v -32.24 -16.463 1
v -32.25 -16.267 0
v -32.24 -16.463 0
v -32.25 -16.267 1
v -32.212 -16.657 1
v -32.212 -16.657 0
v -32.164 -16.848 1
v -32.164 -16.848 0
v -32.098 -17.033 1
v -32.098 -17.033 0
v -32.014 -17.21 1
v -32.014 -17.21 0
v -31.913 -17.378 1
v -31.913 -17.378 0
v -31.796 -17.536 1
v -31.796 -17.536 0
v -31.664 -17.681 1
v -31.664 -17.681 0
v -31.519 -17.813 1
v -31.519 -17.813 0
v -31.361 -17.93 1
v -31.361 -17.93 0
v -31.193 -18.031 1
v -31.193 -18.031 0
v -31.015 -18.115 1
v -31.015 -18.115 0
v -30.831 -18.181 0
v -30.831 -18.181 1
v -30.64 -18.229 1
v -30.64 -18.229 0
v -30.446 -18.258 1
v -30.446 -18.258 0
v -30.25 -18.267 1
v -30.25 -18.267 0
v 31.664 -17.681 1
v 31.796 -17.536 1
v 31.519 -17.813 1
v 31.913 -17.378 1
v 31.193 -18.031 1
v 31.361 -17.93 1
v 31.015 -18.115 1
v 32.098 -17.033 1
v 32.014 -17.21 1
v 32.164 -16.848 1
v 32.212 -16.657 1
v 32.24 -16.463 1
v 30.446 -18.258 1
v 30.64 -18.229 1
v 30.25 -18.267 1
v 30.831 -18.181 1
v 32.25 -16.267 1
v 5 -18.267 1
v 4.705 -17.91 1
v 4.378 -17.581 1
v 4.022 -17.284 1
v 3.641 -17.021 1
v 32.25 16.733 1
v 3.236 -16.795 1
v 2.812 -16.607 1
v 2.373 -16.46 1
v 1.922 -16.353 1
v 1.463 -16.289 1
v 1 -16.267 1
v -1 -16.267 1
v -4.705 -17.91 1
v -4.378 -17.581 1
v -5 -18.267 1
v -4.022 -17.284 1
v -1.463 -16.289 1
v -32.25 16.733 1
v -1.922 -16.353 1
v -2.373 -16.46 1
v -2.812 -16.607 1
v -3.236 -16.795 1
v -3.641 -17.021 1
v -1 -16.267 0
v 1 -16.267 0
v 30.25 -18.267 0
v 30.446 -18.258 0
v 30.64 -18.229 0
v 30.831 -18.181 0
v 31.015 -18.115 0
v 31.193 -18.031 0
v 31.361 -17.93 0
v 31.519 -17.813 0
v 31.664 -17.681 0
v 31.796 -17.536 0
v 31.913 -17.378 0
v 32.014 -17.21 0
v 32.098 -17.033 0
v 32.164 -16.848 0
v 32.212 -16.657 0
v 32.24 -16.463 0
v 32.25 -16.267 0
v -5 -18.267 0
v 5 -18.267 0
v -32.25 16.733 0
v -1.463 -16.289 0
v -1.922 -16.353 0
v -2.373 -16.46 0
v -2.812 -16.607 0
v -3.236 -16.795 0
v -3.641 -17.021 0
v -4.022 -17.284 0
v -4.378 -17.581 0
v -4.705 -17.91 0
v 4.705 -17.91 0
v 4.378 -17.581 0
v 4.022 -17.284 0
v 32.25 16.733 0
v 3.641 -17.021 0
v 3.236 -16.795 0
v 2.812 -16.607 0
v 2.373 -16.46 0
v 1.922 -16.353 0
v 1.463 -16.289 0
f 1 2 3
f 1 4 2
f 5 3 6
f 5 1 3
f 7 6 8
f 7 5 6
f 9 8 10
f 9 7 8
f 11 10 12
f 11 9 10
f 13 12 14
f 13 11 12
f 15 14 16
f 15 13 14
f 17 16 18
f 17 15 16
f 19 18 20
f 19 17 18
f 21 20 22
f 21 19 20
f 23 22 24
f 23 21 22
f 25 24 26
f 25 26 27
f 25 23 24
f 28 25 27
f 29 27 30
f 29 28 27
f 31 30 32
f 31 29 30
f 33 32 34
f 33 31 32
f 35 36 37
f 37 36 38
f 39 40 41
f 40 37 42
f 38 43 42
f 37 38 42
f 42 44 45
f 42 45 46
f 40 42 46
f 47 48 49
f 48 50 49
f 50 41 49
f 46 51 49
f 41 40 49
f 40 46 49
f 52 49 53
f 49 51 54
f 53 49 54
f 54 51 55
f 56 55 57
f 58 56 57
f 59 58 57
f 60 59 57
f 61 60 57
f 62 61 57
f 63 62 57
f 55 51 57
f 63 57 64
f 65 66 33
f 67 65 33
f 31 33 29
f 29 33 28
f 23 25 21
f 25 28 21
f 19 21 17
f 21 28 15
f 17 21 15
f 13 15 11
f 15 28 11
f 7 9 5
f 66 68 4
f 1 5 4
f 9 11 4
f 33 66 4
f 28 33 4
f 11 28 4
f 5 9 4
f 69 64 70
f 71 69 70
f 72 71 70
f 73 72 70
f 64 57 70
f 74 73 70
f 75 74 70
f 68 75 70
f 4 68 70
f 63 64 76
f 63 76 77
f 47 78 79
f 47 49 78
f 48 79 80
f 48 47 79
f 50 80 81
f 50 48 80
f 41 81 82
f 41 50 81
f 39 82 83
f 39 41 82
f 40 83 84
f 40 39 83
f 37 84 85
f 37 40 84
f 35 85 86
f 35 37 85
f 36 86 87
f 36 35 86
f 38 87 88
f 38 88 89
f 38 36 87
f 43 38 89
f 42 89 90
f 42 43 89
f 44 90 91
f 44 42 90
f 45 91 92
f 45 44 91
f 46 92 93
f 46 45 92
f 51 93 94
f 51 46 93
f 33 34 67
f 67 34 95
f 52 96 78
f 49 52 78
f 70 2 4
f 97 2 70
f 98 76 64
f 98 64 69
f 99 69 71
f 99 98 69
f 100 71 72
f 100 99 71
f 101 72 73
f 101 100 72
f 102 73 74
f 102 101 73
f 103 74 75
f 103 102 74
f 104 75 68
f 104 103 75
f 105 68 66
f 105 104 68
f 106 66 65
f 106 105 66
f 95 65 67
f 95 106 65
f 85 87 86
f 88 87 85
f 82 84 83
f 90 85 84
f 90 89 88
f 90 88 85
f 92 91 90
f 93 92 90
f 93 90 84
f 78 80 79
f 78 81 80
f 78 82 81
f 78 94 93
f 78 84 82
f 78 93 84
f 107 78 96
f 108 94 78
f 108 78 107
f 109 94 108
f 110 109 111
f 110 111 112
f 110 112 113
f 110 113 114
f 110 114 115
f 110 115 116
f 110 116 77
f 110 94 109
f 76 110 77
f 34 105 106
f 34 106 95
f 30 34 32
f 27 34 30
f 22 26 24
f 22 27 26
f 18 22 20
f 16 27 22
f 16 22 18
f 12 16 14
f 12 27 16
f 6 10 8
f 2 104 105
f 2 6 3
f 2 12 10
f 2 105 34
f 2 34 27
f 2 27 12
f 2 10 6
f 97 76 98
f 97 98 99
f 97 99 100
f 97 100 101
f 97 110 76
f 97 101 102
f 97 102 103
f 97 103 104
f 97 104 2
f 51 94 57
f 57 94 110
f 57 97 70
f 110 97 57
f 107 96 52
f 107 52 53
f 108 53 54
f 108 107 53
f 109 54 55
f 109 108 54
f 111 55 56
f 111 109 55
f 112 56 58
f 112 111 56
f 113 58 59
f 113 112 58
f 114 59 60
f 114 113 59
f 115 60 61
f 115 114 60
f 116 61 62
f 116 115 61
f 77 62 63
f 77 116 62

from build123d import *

# Parameters (mm, degrees)
F0_W        = 64.5
F0_H        = 35
F1_DEPTH    = 1
F2_R        = 2
F3_W        = 10
F3_H        = 1
F4_DEPTH    = 2
F5_T1_DEPTH = 1


# Not quite as in the source:
# - a fillet or chamfer that OpenCascade refuses, or shapes differently, is made with other operations: its cross-section is extruded or revolved along the edge and cut away or added


with BuildPart() as f1:
    # F0 (on Top) → F1 (new body)
    with BuildSketch(Plane.XY):
        with Locations((0, -0.7672849298)):
            Rectangle(F0_W, F0_H)
    extrude(amount=F1_DEPTH)

    # F2
    f2_edges = [f1.edges().sort_by_distance(p)[0] for p in [
        (-32.25, -18.267285, 0.5),
        (32.25, -18.267285, 0.5),
    ]]
    fillet(f2_edges, radius=F2_R)

    # F3 (on face) → F4 (cut)
    with BuildSketch(Plane.XZ.offset(18.2672849298)):
        with Locations((0, 0.5)):
            Rectangle(F3_W, F3_H)
    extrude(amount=-F4_DEPTH, mode=Mode.SUBTRACT)

    # F5: fillet of radius 5 on 2 edges, made by hand

    # F5_s2 → F5_t1 (join)
    with BuildSketch(Plane.XY):
        with BuildLine():
            ThreePointArc((5, -18.2672849298), (3.2360679775, -16.7951489748), (1, -16.2672849298))
            Line((1, -16.2672849298), (5, -16.2672849298))
            Line((5, -16.2672849298), (5, -18.2672849298))
        make_face()
        with BuildLine():
            ThreePointArc((-1, -16.2672849298), (-3.2360679775, -16.7951489748), (-5, -18.2672849298))
            Line((-5, -18.2672849298), (-5, -16.2672849298))
            Line((-5, -16.2672849298), (-1, -16.2672849298))
        make_face()
    extrude(amount=F5_T1_DEPTH)


solid = f1.part
